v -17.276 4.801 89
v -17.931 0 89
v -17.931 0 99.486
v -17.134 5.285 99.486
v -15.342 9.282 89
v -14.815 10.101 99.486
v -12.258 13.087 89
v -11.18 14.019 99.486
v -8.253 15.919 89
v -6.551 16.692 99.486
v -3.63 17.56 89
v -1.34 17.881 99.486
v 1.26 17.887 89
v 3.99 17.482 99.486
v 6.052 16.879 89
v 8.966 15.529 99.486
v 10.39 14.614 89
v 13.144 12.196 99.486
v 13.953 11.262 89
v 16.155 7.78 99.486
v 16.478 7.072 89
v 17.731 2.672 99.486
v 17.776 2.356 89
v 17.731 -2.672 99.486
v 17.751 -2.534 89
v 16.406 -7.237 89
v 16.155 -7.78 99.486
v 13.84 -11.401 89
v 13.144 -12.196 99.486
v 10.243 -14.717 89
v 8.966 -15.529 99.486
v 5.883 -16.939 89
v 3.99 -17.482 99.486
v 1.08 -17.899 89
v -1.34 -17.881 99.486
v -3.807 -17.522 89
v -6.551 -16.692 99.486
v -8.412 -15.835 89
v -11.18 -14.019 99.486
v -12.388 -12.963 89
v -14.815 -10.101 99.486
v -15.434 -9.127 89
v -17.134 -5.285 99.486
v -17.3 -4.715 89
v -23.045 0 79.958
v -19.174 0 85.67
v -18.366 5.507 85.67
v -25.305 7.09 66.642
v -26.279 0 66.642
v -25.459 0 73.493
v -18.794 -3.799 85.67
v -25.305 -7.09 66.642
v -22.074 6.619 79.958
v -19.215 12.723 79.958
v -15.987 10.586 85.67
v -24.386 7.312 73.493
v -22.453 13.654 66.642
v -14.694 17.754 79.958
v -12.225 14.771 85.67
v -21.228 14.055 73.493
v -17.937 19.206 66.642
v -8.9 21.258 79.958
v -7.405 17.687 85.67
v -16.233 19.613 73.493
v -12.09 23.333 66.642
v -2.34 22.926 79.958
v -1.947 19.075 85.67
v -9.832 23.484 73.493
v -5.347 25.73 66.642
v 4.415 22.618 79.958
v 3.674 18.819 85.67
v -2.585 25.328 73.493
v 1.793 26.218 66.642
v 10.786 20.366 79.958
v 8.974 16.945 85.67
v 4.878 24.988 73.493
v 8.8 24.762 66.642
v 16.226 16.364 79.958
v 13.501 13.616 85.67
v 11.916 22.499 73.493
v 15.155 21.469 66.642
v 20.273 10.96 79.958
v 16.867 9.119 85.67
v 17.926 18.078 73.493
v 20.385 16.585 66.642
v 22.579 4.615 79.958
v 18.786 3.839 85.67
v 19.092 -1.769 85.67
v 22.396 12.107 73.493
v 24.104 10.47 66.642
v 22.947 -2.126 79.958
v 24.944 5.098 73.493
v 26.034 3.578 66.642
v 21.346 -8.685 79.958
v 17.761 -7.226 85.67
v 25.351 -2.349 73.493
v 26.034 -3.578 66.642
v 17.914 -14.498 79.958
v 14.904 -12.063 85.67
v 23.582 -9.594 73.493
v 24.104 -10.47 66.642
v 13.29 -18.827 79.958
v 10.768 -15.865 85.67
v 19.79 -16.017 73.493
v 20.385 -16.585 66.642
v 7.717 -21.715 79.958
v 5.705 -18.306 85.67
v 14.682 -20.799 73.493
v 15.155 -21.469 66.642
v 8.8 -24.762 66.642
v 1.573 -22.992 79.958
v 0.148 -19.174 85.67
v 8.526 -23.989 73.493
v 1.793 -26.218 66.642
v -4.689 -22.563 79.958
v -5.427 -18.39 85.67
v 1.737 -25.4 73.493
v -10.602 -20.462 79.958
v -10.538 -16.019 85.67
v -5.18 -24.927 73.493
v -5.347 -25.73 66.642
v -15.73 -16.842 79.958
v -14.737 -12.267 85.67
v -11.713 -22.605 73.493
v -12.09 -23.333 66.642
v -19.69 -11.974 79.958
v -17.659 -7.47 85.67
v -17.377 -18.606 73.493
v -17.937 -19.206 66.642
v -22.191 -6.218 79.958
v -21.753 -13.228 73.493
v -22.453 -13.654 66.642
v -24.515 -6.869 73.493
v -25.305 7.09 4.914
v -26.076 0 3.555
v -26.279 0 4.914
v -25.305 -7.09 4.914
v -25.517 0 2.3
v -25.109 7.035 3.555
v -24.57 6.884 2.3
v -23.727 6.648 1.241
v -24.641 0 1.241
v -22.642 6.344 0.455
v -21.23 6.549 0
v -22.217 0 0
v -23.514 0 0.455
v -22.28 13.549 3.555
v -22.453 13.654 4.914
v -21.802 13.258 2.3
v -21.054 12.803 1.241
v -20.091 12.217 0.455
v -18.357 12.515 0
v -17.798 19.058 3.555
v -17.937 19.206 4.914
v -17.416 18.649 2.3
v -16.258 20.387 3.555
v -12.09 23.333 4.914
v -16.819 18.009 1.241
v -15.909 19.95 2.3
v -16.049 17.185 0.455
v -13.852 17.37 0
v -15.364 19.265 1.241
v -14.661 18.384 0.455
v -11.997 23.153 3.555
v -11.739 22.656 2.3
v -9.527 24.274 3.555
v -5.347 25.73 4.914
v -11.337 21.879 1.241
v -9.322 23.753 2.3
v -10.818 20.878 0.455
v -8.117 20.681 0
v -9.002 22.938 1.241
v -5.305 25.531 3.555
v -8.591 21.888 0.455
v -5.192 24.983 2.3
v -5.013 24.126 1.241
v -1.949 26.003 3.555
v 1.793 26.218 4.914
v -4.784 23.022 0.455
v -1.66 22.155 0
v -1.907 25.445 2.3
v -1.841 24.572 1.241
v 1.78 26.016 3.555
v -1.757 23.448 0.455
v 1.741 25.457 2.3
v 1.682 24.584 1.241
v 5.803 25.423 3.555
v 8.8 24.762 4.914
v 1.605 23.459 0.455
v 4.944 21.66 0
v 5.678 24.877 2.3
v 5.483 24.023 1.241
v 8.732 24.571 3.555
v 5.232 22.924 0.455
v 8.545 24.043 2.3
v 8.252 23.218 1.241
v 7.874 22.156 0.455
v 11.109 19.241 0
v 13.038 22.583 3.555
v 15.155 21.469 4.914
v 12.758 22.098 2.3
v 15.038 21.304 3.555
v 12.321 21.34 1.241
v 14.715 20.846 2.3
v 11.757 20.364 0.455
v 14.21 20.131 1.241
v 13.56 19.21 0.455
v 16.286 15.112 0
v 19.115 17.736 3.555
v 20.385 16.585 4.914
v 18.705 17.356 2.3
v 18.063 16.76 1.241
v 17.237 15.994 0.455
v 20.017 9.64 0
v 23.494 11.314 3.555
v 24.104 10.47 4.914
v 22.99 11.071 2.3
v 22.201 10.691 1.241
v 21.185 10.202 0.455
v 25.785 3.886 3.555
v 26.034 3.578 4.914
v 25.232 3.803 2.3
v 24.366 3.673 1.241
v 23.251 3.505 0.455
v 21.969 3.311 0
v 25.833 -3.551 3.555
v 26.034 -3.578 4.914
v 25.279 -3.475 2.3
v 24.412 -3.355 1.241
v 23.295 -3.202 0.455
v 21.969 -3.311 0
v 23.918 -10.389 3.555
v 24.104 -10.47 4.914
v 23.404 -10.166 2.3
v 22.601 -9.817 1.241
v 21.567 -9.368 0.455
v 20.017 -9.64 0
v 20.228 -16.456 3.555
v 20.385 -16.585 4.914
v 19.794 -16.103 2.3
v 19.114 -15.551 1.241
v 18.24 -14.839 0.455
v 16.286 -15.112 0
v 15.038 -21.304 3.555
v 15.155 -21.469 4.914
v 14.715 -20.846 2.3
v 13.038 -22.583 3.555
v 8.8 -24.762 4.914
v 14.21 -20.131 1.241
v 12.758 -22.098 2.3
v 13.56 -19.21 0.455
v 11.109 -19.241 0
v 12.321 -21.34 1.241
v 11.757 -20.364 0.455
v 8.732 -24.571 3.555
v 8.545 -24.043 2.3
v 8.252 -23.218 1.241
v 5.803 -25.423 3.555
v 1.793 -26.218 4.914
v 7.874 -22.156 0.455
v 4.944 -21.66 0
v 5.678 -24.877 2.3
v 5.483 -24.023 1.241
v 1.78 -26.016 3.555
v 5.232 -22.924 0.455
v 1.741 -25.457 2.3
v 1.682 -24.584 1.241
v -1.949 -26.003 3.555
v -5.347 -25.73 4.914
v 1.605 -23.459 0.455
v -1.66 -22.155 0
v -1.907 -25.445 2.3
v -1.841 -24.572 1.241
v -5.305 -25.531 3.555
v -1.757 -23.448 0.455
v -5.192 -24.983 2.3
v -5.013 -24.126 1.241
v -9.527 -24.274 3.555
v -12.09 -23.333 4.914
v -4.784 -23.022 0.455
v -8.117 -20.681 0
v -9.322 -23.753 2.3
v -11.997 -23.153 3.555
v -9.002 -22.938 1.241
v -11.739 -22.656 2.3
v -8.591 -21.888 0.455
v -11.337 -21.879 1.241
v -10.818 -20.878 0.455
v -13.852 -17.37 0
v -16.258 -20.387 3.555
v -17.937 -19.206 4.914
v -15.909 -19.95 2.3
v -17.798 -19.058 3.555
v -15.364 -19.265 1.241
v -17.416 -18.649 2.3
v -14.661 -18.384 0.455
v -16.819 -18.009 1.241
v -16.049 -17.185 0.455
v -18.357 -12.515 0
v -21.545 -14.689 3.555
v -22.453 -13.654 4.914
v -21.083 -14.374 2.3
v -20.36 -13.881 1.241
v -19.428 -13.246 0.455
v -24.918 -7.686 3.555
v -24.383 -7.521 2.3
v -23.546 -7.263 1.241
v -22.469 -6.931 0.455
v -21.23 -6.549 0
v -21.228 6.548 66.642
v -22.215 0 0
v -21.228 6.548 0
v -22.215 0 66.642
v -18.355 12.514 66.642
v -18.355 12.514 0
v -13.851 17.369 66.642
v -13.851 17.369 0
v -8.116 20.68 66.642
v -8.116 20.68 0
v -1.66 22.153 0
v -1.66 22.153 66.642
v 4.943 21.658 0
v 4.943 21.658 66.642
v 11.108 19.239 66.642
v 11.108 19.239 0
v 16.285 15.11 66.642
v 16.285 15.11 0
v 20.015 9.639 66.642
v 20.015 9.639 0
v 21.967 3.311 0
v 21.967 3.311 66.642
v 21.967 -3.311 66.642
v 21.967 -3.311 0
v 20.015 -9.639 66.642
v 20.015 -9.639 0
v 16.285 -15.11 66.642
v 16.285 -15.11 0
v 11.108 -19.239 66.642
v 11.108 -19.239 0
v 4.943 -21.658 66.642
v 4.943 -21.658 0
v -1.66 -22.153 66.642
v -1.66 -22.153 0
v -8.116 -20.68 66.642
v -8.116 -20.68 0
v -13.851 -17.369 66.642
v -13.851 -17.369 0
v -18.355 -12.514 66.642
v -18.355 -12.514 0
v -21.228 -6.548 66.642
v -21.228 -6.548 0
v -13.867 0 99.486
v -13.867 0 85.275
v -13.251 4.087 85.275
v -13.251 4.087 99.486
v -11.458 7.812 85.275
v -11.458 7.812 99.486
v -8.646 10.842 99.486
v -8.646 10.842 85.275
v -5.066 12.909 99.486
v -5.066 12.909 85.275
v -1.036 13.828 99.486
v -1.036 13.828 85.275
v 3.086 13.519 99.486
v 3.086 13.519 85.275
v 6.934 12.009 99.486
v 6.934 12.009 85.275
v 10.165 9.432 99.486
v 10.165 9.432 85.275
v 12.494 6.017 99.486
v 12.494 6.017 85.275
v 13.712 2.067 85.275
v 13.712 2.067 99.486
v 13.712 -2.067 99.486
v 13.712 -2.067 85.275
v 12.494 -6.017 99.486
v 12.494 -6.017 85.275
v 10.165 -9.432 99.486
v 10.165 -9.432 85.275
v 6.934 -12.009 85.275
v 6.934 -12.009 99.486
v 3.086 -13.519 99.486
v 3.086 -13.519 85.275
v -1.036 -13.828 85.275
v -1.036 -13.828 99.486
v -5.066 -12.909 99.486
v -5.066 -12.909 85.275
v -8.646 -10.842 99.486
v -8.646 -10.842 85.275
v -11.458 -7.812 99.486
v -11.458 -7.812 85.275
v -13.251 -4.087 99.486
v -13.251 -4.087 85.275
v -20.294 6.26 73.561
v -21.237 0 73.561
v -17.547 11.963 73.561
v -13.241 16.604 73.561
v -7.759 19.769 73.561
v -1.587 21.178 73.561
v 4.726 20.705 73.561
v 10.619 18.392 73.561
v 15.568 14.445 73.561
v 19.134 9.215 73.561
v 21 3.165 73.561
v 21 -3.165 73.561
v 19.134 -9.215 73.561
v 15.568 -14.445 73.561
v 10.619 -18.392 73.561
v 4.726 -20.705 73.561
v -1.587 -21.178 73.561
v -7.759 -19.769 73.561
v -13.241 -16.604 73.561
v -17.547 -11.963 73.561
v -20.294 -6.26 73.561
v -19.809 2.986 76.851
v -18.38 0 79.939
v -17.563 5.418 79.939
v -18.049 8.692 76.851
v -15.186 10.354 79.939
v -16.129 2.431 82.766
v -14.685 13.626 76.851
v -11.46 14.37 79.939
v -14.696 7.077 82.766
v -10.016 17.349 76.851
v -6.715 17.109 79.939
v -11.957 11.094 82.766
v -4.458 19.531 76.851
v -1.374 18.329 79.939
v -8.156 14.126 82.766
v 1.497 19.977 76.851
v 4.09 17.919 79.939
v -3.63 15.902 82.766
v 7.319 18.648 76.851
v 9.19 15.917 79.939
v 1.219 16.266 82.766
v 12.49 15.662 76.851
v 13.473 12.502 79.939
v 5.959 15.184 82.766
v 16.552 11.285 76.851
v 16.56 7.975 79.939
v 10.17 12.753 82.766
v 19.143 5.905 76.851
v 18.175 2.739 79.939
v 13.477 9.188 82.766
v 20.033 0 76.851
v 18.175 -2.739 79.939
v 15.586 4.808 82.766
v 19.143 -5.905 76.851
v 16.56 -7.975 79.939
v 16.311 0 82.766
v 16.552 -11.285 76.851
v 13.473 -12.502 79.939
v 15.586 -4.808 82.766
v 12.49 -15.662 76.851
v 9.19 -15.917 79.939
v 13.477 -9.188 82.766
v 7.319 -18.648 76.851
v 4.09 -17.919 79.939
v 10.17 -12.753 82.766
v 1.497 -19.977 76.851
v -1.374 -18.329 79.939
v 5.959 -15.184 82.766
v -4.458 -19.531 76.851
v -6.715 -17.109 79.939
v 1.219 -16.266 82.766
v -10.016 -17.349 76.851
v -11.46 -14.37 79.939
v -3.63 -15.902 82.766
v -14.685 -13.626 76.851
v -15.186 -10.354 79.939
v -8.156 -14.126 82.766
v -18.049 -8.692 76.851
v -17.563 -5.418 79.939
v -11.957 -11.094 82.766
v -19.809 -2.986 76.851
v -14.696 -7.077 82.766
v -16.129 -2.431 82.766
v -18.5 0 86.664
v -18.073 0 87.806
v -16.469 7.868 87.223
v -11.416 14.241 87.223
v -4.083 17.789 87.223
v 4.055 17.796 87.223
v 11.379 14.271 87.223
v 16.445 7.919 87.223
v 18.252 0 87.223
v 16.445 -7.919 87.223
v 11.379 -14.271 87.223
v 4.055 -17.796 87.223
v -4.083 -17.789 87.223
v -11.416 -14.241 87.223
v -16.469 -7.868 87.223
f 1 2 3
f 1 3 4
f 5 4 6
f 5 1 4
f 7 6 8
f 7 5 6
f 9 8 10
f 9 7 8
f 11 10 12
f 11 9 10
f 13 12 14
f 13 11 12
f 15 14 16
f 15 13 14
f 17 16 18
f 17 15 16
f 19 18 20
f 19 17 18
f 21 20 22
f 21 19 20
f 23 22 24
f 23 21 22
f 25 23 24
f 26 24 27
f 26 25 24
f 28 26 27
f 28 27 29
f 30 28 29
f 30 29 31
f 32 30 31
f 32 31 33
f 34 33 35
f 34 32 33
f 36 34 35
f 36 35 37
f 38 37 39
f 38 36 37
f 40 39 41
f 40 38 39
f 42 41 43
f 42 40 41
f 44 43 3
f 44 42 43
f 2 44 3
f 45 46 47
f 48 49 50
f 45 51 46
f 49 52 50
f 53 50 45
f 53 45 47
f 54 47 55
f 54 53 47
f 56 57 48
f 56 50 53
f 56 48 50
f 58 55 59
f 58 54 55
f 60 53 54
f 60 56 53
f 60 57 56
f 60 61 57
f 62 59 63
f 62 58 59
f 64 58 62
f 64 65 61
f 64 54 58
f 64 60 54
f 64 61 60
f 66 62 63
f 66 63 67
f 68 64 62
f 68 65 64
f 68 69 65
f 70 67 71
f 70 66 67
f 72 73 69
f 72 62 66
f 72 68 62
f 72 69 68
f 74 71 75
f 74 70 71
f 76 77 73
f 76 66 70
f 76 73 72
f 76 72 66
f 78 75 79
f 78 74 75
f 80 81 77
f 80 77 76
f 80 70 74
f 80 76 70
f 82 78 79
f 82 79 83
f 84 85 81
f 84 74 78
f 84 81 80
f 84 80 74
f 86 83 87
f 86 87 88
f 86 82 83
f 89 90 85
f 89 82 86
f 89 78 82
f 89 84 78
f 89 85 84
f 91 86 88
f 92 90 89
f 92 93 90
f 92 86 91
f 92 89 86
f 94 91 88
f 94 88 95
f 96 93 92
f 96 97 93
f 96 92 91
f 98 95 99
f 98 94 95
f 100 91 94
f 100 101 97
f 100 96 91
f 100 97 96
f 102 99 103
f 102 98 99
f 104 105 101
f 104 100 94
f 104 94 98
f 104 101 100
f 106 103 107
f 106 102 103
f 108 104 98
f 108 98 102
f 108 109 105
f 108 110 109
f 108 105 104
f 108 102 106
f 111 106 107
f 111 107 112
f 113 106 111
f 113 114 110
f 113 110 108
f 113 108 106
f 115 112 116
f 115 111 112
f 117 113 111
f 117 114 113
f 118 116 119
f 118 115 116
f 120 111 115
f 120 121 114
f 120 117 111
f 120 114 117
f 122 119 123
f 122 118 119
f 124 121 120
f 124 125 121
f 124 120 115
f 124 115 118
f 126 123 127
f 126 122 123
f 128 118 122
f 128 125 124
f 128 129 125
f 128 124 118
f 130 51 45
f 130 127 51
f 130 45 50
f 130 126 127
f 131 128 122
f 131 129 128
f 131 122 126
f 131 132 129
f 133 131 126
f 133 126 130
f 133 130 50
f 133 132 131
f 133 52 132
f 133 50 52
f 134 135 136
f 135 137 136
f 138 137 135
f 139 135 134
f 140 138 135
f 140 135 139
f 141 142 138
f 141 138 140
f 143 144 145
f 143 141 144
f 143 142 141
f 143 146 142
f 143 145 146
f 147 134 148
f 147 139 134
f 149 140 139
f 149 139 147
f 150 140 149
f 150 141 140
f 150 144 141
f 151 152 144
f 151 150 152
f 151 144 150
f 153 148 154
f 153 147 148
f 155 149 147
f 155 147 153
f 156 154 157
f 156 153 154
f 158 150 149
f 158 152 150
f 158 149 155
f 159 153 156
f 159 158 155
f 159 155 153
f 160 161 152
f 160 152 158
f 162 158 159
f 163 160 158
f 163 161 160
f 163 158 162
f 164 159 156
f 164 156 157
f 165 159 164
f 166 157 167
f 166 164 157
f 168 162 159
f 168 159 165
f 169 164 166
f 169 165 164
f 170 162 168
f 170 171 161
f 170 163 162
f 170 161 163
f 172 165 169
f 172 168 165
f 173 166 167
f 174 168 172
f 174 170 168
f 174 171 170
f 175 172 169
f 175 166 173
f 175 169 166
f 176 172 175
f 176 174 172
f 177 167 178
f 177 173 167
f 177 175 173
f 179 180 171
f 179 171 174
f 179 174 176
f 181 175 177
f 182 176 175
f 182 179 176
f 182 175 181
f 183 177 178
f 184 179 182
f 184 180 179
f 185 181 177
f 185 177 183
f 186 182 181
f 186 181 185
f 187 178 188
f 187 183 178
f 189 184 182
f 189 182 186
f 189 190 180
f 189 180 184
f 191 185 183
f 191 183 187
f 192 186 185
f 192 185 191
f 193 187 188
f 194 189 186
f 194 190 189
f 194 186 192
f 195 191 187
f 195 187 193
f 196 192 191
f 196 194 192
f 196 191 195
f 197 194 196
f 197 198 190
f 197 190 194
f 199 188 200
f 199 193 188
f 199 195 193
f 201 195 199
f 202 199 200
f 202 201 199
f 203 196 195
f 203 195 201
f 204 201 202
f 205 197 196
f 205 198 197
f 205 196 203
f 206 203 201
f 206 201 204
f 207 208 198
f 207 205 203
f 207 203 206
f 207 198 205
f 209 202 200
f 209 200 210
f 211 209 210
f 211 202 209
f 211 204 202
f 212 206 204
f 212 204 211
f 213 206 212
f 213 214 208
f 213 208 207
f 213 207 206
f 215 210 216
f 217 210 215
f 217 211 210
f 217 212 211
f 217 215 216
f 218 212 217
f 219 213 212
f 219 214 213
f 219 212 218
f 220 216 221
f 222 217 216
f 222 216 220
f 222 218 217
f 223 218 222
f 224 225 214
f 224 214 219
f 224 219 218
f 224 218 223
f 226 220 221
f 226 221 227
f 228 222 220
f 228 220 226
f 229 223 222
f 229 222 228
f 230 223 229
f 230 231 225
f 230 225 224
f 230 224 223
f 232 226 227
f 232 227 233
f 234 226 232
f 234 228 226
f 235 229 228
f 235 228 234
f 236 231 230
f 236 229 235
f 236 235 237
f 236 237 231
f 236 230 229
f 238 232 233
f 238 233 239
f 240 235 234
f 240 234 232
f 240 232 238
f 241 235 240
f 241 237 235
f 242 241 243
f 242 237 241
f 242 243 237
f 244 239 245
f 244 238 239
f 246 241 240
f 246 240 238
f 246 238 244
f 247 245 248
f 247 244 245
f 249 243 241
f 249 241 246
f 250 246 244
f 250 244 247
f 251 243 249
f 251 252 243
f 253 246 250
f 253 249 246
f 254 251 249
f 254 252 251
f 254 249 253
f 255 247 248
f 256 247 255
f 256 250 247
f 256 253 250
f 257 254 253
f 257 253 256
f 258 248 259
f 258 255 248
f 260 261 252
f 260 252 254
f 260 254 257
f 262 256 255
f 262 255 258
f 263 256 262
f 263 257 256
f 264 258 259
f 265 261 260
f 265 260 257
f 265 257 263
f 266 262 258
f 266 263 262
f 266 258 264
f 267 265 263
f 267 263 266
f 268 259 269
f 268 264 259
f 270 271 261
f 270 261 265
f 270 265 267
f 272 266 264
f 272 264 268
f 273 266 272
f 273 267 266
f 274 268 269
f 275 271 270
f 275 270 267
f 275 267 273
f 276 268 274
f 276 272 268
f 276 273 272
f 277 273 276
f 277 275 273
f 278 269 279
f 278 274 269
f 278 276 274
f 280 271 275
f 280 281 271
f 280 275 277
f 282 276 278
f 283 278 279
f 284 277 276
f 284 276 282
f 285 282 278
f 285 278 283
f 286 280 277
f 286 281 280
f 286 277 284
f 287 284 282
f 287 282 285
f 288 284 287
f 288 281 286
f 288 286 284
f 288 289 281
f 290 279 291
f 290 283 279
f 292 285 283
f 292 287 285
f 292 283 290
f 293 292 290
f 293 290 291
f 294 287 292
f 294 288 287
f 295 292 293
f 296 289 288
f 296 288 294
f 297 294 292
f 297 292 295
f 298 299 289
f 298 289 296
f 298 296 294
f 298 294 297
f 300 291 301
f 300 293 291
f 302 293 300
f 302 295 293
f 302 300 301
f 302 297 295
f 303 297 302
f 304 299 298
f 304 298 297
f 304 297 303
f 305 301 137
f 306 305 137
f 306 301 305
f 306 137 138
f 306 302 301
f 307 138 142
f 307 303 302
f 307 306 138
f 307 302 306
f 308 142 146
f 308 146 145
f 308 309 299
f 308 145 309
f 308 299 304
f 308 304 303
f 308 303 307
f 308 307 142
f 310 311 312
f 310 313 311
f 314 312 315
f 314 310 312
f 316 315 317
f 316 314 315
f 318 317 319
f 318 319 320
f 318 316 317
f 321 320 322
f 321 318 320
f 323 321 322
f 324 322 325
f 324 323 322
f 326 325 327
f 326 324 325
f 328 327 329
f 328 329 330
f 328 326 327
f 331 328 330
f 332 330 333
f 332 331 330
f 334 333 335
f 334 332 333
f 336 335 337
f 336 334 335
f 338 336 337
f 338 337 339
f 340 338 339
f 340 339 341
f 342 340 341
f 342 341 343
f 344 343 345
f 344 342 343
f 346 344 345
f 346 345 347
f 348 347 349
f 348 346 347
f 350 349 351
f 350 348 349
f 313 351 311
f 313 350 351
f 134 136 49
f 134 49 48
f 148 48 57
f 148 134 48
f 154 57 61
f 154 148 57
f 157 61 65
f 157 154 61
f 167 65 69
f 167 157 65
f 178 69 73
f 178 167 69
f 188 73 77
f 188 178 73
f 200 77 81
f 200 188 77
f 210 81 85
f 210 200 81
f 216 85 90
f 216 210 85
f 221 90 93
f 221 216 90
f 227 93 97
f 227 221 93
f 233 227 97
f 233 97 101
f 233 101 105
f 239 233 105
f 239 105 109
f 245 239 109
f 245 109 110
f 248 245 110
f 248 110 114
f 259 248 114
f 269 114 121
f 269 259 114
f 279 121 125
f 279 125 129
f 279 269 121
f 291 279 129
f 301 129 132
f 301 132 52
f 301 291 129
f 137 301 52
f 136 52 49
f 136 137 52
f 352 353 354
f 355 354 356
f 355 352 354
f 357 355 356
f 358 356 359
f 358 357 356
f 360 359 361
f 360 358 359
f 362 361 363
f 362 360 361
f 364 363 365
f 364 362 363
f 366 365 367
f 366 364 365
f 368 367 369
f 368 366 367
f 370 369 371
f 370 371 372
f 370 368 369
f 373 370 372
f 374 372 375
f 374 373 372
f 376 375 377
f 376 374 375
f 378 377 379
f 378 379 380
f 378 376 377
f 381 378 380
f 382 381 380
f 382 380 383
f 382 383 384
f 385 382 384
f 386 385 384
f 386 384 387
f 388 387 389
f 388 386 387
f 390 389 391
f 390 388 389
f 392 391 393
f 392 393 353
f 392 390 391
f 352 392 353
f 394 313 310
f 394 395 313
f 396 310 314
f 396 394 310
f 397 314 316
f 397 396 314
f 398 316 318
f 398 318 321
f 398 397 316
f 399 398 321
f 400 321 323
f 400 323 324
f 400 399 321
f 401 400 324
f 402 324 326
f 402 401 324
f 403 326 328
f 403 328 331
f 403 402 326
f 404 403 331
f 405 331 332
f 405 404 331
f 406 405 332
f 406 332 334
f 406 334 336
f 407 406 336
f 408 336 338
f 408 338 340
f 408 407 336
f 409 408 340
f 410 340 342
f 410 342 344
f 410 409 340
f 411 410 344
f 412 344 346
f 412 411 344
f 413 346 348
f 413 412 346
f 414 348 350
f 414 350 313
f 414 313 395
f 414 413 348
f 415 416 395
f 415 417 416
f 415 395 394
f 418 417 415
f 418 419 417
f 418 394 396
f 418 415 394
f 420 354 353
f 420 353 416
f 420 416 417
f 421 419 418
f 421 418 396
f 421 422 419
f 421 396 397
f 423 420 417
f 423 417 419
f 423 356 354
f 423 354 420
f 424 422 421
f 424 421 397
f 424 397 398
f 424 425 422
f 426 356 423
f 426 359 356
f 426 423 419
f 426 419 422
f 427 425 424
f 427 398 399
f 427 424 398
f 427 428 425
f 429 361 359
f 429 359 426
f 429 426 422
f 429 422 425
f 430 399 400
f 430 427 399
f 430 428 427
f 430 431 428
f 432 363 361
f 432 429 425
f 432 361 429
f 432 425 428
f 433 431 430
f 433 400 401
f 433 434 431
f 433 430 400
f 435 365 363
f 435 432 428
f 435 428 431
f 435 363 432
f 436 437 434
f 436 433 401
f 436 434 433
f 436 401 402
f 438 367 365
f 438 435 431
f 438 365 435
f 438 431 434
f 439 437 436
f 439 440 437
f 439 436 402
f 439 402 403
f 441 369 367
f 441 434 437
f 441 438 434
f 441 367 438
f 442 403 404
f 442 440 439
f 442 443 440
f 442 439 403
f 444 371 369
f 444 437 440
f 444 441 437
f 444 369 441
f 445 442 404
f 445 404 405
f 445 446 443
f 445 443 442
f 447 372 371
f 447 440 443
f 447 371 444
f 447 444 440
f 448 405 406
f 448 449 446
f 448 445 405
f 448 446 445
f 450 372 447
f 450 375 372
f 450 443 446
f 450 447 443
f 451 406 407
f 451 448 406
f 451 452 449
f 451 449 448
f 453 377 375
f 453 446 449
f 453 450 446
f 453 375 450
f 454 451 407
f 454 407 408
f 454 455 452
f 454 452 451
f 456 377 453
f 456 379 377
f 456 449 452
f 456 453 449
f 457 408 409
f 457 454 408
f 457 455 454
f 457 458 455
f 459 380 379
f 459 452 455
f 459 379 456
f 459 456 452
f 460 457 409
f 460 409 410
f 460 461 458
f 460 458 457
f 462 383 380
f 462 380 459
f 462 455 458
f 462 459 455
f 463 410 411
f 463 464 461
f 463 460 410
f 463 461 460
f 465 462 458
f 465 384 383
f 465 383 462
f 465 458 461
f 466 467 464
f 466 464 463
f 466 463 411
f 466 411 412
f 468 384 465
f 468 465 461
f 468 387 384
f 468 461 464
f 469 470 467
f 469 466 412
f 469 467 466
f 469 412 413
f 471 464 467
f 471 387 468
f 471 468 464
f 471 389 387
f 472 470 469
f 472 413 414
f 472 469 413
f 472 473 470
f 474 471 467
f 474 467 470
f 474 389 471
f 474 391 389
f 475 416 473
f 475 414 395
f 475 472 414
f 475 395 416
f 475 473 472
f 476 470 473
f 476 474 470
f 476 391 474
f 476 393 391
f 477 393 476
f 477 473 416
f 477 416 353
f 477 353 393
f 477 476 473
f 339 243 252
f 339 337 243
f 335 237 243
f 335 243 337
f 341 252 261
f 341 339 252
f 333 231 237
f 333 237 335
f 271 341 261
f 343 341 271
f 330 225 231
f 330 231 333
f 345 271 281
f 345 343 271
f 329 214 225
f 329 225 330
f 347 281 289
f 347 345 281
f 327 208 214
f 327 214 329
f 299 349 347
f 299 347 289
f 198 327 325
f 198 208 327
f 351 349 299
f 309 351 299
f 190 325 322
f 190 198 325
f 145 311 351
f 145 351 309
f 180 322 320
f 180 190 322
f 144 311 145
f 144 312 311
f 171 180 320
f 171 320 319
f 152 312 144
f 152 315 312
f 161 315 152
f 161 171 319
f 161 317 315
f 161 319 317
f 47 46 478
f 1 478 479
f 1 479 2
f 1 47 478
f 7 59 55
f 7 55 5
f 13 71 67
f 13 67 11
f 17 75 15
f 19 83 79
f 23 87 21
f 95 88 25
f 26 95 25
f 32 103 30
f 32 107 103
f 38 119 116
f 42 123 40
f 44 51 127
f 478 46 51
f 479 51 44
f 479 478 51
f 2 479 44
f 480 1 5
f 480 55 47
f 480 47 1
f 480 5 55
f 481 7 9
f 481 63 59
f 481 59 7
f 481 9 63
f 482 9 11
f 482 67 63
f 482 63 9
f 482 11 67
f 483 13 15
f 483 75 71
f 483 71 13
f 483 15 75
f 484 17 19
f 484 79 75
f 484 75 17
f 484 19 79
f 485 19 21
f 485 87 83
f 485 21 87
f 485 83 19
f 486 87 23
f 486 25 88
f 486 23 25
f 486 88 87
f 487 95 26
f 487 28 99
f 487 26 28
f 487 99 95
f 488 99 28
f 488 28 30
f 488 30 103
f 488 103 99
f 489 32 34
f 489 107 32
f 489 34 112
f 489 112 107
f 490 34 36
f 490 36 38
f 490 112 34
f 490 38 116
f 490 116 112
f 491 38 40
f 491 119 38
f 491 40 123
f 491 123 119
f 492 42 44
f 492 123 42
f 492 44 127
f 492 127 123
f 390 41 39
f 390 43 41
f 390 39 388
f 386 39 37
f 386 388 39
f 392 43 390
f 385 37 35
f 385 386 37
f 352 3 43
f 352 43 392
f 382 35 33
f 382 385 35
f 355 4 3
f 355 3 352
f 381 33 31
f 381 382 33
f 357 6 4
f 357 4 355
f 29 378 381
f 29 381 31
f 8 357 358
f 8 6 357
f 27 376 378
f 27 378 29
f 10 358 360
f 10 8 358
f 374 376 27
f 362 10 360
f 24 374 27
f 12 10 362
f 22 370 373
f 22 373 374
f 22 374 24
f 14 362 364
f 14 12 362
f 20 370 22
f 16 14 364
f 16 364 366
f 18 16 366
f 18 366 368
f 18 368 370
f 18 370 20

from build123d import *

# Parameters (mm, degrees)
F3_R = 5.08


# Not quite as in the source:
# - a fillet or chamfer that OpenCascade refuses, or shapes differently, is made with other operations: its cross-section is extruded or revolved along the edge and cut away or added


with BuildPart() as f1:
    # F0 (on Front) → F1 (revolve)
    with BuildSketch(Plane.XZ):
        with BuildLine():
            Line((-26.2792315334, 0), (-22.2152307564, 0))
            Line((-22.2152307564, 0), (-22.2152307564, 66.6416212916))
            ThreePointArc((-22.2152307564, 66.6416212916), (-20.0328257832, 76.8506354666), (-13.8671085173, 85.2750519145))
            Line((-13.8671085173, 85.2750519145), (-13.8671085173, 99.4861274958))
            Line((-13.8671085173, 99.4861274958), (-17.9311092943, 99.4861274958))
            Line((-17.9311092943, 99.4861274958), (-17.9311092943, 87.0146006346))
            ThreePointArc((-17.9311092943, 87.0146006346), (-24.1112579421, 77.6501342728), (-26.2792315334, 66.6416212916))
            Line((-26.2792315334, 66.6416212916), (-26.2792315334, 0))
        make_face()
    revolve(axis=Axis((0, 0, 49.7430637479), (0, 0, -1)))

    # F2: fillet of radius 5.08 on 1 edges, made by hand

    # F2_s1 → F2_t2 (revolve, cut)
    with BuildSketch(Plane.XZ):
        with BuildLine():
            ThreePointArc((-26.2796315334, 4.9781517325), (-25.134523883, 1.7647190024), (-22.2153108172, -0.0003919059))
            Line((-22.2153108172, -0.0003919059), (-22.3170153141, -0.4982462698))
            ThreePointArc((-22.3170153141, -0.4982462698), (-24.2472711753, -0.5081365685), (-26.2792315334, -0.5081365685))
            Line((-26.2792315334, -0.5081365685), (-26.787368102, 0))
            ThreePointArc((-26.787368102, 0), (-26.787368102, 2.4890758662), (-26.787768102, 4.9781517325))
            Line((-26.787768102, 4.9781517325), (-26.2796315334, 4.9781517325))
        make_face()
    revolve(axis=Axis((0, 0, 0), (0, 0, -1)), mode=Mode.SUBTRACT)

    # F3
    f3_edges = [f1.edges().sort_by_distance(p)[0] for p in [
        (17.931109, 0, 87.014601),
    ]]
    fillet(f3_edges, radius=F3_R)


solid = f1.part
